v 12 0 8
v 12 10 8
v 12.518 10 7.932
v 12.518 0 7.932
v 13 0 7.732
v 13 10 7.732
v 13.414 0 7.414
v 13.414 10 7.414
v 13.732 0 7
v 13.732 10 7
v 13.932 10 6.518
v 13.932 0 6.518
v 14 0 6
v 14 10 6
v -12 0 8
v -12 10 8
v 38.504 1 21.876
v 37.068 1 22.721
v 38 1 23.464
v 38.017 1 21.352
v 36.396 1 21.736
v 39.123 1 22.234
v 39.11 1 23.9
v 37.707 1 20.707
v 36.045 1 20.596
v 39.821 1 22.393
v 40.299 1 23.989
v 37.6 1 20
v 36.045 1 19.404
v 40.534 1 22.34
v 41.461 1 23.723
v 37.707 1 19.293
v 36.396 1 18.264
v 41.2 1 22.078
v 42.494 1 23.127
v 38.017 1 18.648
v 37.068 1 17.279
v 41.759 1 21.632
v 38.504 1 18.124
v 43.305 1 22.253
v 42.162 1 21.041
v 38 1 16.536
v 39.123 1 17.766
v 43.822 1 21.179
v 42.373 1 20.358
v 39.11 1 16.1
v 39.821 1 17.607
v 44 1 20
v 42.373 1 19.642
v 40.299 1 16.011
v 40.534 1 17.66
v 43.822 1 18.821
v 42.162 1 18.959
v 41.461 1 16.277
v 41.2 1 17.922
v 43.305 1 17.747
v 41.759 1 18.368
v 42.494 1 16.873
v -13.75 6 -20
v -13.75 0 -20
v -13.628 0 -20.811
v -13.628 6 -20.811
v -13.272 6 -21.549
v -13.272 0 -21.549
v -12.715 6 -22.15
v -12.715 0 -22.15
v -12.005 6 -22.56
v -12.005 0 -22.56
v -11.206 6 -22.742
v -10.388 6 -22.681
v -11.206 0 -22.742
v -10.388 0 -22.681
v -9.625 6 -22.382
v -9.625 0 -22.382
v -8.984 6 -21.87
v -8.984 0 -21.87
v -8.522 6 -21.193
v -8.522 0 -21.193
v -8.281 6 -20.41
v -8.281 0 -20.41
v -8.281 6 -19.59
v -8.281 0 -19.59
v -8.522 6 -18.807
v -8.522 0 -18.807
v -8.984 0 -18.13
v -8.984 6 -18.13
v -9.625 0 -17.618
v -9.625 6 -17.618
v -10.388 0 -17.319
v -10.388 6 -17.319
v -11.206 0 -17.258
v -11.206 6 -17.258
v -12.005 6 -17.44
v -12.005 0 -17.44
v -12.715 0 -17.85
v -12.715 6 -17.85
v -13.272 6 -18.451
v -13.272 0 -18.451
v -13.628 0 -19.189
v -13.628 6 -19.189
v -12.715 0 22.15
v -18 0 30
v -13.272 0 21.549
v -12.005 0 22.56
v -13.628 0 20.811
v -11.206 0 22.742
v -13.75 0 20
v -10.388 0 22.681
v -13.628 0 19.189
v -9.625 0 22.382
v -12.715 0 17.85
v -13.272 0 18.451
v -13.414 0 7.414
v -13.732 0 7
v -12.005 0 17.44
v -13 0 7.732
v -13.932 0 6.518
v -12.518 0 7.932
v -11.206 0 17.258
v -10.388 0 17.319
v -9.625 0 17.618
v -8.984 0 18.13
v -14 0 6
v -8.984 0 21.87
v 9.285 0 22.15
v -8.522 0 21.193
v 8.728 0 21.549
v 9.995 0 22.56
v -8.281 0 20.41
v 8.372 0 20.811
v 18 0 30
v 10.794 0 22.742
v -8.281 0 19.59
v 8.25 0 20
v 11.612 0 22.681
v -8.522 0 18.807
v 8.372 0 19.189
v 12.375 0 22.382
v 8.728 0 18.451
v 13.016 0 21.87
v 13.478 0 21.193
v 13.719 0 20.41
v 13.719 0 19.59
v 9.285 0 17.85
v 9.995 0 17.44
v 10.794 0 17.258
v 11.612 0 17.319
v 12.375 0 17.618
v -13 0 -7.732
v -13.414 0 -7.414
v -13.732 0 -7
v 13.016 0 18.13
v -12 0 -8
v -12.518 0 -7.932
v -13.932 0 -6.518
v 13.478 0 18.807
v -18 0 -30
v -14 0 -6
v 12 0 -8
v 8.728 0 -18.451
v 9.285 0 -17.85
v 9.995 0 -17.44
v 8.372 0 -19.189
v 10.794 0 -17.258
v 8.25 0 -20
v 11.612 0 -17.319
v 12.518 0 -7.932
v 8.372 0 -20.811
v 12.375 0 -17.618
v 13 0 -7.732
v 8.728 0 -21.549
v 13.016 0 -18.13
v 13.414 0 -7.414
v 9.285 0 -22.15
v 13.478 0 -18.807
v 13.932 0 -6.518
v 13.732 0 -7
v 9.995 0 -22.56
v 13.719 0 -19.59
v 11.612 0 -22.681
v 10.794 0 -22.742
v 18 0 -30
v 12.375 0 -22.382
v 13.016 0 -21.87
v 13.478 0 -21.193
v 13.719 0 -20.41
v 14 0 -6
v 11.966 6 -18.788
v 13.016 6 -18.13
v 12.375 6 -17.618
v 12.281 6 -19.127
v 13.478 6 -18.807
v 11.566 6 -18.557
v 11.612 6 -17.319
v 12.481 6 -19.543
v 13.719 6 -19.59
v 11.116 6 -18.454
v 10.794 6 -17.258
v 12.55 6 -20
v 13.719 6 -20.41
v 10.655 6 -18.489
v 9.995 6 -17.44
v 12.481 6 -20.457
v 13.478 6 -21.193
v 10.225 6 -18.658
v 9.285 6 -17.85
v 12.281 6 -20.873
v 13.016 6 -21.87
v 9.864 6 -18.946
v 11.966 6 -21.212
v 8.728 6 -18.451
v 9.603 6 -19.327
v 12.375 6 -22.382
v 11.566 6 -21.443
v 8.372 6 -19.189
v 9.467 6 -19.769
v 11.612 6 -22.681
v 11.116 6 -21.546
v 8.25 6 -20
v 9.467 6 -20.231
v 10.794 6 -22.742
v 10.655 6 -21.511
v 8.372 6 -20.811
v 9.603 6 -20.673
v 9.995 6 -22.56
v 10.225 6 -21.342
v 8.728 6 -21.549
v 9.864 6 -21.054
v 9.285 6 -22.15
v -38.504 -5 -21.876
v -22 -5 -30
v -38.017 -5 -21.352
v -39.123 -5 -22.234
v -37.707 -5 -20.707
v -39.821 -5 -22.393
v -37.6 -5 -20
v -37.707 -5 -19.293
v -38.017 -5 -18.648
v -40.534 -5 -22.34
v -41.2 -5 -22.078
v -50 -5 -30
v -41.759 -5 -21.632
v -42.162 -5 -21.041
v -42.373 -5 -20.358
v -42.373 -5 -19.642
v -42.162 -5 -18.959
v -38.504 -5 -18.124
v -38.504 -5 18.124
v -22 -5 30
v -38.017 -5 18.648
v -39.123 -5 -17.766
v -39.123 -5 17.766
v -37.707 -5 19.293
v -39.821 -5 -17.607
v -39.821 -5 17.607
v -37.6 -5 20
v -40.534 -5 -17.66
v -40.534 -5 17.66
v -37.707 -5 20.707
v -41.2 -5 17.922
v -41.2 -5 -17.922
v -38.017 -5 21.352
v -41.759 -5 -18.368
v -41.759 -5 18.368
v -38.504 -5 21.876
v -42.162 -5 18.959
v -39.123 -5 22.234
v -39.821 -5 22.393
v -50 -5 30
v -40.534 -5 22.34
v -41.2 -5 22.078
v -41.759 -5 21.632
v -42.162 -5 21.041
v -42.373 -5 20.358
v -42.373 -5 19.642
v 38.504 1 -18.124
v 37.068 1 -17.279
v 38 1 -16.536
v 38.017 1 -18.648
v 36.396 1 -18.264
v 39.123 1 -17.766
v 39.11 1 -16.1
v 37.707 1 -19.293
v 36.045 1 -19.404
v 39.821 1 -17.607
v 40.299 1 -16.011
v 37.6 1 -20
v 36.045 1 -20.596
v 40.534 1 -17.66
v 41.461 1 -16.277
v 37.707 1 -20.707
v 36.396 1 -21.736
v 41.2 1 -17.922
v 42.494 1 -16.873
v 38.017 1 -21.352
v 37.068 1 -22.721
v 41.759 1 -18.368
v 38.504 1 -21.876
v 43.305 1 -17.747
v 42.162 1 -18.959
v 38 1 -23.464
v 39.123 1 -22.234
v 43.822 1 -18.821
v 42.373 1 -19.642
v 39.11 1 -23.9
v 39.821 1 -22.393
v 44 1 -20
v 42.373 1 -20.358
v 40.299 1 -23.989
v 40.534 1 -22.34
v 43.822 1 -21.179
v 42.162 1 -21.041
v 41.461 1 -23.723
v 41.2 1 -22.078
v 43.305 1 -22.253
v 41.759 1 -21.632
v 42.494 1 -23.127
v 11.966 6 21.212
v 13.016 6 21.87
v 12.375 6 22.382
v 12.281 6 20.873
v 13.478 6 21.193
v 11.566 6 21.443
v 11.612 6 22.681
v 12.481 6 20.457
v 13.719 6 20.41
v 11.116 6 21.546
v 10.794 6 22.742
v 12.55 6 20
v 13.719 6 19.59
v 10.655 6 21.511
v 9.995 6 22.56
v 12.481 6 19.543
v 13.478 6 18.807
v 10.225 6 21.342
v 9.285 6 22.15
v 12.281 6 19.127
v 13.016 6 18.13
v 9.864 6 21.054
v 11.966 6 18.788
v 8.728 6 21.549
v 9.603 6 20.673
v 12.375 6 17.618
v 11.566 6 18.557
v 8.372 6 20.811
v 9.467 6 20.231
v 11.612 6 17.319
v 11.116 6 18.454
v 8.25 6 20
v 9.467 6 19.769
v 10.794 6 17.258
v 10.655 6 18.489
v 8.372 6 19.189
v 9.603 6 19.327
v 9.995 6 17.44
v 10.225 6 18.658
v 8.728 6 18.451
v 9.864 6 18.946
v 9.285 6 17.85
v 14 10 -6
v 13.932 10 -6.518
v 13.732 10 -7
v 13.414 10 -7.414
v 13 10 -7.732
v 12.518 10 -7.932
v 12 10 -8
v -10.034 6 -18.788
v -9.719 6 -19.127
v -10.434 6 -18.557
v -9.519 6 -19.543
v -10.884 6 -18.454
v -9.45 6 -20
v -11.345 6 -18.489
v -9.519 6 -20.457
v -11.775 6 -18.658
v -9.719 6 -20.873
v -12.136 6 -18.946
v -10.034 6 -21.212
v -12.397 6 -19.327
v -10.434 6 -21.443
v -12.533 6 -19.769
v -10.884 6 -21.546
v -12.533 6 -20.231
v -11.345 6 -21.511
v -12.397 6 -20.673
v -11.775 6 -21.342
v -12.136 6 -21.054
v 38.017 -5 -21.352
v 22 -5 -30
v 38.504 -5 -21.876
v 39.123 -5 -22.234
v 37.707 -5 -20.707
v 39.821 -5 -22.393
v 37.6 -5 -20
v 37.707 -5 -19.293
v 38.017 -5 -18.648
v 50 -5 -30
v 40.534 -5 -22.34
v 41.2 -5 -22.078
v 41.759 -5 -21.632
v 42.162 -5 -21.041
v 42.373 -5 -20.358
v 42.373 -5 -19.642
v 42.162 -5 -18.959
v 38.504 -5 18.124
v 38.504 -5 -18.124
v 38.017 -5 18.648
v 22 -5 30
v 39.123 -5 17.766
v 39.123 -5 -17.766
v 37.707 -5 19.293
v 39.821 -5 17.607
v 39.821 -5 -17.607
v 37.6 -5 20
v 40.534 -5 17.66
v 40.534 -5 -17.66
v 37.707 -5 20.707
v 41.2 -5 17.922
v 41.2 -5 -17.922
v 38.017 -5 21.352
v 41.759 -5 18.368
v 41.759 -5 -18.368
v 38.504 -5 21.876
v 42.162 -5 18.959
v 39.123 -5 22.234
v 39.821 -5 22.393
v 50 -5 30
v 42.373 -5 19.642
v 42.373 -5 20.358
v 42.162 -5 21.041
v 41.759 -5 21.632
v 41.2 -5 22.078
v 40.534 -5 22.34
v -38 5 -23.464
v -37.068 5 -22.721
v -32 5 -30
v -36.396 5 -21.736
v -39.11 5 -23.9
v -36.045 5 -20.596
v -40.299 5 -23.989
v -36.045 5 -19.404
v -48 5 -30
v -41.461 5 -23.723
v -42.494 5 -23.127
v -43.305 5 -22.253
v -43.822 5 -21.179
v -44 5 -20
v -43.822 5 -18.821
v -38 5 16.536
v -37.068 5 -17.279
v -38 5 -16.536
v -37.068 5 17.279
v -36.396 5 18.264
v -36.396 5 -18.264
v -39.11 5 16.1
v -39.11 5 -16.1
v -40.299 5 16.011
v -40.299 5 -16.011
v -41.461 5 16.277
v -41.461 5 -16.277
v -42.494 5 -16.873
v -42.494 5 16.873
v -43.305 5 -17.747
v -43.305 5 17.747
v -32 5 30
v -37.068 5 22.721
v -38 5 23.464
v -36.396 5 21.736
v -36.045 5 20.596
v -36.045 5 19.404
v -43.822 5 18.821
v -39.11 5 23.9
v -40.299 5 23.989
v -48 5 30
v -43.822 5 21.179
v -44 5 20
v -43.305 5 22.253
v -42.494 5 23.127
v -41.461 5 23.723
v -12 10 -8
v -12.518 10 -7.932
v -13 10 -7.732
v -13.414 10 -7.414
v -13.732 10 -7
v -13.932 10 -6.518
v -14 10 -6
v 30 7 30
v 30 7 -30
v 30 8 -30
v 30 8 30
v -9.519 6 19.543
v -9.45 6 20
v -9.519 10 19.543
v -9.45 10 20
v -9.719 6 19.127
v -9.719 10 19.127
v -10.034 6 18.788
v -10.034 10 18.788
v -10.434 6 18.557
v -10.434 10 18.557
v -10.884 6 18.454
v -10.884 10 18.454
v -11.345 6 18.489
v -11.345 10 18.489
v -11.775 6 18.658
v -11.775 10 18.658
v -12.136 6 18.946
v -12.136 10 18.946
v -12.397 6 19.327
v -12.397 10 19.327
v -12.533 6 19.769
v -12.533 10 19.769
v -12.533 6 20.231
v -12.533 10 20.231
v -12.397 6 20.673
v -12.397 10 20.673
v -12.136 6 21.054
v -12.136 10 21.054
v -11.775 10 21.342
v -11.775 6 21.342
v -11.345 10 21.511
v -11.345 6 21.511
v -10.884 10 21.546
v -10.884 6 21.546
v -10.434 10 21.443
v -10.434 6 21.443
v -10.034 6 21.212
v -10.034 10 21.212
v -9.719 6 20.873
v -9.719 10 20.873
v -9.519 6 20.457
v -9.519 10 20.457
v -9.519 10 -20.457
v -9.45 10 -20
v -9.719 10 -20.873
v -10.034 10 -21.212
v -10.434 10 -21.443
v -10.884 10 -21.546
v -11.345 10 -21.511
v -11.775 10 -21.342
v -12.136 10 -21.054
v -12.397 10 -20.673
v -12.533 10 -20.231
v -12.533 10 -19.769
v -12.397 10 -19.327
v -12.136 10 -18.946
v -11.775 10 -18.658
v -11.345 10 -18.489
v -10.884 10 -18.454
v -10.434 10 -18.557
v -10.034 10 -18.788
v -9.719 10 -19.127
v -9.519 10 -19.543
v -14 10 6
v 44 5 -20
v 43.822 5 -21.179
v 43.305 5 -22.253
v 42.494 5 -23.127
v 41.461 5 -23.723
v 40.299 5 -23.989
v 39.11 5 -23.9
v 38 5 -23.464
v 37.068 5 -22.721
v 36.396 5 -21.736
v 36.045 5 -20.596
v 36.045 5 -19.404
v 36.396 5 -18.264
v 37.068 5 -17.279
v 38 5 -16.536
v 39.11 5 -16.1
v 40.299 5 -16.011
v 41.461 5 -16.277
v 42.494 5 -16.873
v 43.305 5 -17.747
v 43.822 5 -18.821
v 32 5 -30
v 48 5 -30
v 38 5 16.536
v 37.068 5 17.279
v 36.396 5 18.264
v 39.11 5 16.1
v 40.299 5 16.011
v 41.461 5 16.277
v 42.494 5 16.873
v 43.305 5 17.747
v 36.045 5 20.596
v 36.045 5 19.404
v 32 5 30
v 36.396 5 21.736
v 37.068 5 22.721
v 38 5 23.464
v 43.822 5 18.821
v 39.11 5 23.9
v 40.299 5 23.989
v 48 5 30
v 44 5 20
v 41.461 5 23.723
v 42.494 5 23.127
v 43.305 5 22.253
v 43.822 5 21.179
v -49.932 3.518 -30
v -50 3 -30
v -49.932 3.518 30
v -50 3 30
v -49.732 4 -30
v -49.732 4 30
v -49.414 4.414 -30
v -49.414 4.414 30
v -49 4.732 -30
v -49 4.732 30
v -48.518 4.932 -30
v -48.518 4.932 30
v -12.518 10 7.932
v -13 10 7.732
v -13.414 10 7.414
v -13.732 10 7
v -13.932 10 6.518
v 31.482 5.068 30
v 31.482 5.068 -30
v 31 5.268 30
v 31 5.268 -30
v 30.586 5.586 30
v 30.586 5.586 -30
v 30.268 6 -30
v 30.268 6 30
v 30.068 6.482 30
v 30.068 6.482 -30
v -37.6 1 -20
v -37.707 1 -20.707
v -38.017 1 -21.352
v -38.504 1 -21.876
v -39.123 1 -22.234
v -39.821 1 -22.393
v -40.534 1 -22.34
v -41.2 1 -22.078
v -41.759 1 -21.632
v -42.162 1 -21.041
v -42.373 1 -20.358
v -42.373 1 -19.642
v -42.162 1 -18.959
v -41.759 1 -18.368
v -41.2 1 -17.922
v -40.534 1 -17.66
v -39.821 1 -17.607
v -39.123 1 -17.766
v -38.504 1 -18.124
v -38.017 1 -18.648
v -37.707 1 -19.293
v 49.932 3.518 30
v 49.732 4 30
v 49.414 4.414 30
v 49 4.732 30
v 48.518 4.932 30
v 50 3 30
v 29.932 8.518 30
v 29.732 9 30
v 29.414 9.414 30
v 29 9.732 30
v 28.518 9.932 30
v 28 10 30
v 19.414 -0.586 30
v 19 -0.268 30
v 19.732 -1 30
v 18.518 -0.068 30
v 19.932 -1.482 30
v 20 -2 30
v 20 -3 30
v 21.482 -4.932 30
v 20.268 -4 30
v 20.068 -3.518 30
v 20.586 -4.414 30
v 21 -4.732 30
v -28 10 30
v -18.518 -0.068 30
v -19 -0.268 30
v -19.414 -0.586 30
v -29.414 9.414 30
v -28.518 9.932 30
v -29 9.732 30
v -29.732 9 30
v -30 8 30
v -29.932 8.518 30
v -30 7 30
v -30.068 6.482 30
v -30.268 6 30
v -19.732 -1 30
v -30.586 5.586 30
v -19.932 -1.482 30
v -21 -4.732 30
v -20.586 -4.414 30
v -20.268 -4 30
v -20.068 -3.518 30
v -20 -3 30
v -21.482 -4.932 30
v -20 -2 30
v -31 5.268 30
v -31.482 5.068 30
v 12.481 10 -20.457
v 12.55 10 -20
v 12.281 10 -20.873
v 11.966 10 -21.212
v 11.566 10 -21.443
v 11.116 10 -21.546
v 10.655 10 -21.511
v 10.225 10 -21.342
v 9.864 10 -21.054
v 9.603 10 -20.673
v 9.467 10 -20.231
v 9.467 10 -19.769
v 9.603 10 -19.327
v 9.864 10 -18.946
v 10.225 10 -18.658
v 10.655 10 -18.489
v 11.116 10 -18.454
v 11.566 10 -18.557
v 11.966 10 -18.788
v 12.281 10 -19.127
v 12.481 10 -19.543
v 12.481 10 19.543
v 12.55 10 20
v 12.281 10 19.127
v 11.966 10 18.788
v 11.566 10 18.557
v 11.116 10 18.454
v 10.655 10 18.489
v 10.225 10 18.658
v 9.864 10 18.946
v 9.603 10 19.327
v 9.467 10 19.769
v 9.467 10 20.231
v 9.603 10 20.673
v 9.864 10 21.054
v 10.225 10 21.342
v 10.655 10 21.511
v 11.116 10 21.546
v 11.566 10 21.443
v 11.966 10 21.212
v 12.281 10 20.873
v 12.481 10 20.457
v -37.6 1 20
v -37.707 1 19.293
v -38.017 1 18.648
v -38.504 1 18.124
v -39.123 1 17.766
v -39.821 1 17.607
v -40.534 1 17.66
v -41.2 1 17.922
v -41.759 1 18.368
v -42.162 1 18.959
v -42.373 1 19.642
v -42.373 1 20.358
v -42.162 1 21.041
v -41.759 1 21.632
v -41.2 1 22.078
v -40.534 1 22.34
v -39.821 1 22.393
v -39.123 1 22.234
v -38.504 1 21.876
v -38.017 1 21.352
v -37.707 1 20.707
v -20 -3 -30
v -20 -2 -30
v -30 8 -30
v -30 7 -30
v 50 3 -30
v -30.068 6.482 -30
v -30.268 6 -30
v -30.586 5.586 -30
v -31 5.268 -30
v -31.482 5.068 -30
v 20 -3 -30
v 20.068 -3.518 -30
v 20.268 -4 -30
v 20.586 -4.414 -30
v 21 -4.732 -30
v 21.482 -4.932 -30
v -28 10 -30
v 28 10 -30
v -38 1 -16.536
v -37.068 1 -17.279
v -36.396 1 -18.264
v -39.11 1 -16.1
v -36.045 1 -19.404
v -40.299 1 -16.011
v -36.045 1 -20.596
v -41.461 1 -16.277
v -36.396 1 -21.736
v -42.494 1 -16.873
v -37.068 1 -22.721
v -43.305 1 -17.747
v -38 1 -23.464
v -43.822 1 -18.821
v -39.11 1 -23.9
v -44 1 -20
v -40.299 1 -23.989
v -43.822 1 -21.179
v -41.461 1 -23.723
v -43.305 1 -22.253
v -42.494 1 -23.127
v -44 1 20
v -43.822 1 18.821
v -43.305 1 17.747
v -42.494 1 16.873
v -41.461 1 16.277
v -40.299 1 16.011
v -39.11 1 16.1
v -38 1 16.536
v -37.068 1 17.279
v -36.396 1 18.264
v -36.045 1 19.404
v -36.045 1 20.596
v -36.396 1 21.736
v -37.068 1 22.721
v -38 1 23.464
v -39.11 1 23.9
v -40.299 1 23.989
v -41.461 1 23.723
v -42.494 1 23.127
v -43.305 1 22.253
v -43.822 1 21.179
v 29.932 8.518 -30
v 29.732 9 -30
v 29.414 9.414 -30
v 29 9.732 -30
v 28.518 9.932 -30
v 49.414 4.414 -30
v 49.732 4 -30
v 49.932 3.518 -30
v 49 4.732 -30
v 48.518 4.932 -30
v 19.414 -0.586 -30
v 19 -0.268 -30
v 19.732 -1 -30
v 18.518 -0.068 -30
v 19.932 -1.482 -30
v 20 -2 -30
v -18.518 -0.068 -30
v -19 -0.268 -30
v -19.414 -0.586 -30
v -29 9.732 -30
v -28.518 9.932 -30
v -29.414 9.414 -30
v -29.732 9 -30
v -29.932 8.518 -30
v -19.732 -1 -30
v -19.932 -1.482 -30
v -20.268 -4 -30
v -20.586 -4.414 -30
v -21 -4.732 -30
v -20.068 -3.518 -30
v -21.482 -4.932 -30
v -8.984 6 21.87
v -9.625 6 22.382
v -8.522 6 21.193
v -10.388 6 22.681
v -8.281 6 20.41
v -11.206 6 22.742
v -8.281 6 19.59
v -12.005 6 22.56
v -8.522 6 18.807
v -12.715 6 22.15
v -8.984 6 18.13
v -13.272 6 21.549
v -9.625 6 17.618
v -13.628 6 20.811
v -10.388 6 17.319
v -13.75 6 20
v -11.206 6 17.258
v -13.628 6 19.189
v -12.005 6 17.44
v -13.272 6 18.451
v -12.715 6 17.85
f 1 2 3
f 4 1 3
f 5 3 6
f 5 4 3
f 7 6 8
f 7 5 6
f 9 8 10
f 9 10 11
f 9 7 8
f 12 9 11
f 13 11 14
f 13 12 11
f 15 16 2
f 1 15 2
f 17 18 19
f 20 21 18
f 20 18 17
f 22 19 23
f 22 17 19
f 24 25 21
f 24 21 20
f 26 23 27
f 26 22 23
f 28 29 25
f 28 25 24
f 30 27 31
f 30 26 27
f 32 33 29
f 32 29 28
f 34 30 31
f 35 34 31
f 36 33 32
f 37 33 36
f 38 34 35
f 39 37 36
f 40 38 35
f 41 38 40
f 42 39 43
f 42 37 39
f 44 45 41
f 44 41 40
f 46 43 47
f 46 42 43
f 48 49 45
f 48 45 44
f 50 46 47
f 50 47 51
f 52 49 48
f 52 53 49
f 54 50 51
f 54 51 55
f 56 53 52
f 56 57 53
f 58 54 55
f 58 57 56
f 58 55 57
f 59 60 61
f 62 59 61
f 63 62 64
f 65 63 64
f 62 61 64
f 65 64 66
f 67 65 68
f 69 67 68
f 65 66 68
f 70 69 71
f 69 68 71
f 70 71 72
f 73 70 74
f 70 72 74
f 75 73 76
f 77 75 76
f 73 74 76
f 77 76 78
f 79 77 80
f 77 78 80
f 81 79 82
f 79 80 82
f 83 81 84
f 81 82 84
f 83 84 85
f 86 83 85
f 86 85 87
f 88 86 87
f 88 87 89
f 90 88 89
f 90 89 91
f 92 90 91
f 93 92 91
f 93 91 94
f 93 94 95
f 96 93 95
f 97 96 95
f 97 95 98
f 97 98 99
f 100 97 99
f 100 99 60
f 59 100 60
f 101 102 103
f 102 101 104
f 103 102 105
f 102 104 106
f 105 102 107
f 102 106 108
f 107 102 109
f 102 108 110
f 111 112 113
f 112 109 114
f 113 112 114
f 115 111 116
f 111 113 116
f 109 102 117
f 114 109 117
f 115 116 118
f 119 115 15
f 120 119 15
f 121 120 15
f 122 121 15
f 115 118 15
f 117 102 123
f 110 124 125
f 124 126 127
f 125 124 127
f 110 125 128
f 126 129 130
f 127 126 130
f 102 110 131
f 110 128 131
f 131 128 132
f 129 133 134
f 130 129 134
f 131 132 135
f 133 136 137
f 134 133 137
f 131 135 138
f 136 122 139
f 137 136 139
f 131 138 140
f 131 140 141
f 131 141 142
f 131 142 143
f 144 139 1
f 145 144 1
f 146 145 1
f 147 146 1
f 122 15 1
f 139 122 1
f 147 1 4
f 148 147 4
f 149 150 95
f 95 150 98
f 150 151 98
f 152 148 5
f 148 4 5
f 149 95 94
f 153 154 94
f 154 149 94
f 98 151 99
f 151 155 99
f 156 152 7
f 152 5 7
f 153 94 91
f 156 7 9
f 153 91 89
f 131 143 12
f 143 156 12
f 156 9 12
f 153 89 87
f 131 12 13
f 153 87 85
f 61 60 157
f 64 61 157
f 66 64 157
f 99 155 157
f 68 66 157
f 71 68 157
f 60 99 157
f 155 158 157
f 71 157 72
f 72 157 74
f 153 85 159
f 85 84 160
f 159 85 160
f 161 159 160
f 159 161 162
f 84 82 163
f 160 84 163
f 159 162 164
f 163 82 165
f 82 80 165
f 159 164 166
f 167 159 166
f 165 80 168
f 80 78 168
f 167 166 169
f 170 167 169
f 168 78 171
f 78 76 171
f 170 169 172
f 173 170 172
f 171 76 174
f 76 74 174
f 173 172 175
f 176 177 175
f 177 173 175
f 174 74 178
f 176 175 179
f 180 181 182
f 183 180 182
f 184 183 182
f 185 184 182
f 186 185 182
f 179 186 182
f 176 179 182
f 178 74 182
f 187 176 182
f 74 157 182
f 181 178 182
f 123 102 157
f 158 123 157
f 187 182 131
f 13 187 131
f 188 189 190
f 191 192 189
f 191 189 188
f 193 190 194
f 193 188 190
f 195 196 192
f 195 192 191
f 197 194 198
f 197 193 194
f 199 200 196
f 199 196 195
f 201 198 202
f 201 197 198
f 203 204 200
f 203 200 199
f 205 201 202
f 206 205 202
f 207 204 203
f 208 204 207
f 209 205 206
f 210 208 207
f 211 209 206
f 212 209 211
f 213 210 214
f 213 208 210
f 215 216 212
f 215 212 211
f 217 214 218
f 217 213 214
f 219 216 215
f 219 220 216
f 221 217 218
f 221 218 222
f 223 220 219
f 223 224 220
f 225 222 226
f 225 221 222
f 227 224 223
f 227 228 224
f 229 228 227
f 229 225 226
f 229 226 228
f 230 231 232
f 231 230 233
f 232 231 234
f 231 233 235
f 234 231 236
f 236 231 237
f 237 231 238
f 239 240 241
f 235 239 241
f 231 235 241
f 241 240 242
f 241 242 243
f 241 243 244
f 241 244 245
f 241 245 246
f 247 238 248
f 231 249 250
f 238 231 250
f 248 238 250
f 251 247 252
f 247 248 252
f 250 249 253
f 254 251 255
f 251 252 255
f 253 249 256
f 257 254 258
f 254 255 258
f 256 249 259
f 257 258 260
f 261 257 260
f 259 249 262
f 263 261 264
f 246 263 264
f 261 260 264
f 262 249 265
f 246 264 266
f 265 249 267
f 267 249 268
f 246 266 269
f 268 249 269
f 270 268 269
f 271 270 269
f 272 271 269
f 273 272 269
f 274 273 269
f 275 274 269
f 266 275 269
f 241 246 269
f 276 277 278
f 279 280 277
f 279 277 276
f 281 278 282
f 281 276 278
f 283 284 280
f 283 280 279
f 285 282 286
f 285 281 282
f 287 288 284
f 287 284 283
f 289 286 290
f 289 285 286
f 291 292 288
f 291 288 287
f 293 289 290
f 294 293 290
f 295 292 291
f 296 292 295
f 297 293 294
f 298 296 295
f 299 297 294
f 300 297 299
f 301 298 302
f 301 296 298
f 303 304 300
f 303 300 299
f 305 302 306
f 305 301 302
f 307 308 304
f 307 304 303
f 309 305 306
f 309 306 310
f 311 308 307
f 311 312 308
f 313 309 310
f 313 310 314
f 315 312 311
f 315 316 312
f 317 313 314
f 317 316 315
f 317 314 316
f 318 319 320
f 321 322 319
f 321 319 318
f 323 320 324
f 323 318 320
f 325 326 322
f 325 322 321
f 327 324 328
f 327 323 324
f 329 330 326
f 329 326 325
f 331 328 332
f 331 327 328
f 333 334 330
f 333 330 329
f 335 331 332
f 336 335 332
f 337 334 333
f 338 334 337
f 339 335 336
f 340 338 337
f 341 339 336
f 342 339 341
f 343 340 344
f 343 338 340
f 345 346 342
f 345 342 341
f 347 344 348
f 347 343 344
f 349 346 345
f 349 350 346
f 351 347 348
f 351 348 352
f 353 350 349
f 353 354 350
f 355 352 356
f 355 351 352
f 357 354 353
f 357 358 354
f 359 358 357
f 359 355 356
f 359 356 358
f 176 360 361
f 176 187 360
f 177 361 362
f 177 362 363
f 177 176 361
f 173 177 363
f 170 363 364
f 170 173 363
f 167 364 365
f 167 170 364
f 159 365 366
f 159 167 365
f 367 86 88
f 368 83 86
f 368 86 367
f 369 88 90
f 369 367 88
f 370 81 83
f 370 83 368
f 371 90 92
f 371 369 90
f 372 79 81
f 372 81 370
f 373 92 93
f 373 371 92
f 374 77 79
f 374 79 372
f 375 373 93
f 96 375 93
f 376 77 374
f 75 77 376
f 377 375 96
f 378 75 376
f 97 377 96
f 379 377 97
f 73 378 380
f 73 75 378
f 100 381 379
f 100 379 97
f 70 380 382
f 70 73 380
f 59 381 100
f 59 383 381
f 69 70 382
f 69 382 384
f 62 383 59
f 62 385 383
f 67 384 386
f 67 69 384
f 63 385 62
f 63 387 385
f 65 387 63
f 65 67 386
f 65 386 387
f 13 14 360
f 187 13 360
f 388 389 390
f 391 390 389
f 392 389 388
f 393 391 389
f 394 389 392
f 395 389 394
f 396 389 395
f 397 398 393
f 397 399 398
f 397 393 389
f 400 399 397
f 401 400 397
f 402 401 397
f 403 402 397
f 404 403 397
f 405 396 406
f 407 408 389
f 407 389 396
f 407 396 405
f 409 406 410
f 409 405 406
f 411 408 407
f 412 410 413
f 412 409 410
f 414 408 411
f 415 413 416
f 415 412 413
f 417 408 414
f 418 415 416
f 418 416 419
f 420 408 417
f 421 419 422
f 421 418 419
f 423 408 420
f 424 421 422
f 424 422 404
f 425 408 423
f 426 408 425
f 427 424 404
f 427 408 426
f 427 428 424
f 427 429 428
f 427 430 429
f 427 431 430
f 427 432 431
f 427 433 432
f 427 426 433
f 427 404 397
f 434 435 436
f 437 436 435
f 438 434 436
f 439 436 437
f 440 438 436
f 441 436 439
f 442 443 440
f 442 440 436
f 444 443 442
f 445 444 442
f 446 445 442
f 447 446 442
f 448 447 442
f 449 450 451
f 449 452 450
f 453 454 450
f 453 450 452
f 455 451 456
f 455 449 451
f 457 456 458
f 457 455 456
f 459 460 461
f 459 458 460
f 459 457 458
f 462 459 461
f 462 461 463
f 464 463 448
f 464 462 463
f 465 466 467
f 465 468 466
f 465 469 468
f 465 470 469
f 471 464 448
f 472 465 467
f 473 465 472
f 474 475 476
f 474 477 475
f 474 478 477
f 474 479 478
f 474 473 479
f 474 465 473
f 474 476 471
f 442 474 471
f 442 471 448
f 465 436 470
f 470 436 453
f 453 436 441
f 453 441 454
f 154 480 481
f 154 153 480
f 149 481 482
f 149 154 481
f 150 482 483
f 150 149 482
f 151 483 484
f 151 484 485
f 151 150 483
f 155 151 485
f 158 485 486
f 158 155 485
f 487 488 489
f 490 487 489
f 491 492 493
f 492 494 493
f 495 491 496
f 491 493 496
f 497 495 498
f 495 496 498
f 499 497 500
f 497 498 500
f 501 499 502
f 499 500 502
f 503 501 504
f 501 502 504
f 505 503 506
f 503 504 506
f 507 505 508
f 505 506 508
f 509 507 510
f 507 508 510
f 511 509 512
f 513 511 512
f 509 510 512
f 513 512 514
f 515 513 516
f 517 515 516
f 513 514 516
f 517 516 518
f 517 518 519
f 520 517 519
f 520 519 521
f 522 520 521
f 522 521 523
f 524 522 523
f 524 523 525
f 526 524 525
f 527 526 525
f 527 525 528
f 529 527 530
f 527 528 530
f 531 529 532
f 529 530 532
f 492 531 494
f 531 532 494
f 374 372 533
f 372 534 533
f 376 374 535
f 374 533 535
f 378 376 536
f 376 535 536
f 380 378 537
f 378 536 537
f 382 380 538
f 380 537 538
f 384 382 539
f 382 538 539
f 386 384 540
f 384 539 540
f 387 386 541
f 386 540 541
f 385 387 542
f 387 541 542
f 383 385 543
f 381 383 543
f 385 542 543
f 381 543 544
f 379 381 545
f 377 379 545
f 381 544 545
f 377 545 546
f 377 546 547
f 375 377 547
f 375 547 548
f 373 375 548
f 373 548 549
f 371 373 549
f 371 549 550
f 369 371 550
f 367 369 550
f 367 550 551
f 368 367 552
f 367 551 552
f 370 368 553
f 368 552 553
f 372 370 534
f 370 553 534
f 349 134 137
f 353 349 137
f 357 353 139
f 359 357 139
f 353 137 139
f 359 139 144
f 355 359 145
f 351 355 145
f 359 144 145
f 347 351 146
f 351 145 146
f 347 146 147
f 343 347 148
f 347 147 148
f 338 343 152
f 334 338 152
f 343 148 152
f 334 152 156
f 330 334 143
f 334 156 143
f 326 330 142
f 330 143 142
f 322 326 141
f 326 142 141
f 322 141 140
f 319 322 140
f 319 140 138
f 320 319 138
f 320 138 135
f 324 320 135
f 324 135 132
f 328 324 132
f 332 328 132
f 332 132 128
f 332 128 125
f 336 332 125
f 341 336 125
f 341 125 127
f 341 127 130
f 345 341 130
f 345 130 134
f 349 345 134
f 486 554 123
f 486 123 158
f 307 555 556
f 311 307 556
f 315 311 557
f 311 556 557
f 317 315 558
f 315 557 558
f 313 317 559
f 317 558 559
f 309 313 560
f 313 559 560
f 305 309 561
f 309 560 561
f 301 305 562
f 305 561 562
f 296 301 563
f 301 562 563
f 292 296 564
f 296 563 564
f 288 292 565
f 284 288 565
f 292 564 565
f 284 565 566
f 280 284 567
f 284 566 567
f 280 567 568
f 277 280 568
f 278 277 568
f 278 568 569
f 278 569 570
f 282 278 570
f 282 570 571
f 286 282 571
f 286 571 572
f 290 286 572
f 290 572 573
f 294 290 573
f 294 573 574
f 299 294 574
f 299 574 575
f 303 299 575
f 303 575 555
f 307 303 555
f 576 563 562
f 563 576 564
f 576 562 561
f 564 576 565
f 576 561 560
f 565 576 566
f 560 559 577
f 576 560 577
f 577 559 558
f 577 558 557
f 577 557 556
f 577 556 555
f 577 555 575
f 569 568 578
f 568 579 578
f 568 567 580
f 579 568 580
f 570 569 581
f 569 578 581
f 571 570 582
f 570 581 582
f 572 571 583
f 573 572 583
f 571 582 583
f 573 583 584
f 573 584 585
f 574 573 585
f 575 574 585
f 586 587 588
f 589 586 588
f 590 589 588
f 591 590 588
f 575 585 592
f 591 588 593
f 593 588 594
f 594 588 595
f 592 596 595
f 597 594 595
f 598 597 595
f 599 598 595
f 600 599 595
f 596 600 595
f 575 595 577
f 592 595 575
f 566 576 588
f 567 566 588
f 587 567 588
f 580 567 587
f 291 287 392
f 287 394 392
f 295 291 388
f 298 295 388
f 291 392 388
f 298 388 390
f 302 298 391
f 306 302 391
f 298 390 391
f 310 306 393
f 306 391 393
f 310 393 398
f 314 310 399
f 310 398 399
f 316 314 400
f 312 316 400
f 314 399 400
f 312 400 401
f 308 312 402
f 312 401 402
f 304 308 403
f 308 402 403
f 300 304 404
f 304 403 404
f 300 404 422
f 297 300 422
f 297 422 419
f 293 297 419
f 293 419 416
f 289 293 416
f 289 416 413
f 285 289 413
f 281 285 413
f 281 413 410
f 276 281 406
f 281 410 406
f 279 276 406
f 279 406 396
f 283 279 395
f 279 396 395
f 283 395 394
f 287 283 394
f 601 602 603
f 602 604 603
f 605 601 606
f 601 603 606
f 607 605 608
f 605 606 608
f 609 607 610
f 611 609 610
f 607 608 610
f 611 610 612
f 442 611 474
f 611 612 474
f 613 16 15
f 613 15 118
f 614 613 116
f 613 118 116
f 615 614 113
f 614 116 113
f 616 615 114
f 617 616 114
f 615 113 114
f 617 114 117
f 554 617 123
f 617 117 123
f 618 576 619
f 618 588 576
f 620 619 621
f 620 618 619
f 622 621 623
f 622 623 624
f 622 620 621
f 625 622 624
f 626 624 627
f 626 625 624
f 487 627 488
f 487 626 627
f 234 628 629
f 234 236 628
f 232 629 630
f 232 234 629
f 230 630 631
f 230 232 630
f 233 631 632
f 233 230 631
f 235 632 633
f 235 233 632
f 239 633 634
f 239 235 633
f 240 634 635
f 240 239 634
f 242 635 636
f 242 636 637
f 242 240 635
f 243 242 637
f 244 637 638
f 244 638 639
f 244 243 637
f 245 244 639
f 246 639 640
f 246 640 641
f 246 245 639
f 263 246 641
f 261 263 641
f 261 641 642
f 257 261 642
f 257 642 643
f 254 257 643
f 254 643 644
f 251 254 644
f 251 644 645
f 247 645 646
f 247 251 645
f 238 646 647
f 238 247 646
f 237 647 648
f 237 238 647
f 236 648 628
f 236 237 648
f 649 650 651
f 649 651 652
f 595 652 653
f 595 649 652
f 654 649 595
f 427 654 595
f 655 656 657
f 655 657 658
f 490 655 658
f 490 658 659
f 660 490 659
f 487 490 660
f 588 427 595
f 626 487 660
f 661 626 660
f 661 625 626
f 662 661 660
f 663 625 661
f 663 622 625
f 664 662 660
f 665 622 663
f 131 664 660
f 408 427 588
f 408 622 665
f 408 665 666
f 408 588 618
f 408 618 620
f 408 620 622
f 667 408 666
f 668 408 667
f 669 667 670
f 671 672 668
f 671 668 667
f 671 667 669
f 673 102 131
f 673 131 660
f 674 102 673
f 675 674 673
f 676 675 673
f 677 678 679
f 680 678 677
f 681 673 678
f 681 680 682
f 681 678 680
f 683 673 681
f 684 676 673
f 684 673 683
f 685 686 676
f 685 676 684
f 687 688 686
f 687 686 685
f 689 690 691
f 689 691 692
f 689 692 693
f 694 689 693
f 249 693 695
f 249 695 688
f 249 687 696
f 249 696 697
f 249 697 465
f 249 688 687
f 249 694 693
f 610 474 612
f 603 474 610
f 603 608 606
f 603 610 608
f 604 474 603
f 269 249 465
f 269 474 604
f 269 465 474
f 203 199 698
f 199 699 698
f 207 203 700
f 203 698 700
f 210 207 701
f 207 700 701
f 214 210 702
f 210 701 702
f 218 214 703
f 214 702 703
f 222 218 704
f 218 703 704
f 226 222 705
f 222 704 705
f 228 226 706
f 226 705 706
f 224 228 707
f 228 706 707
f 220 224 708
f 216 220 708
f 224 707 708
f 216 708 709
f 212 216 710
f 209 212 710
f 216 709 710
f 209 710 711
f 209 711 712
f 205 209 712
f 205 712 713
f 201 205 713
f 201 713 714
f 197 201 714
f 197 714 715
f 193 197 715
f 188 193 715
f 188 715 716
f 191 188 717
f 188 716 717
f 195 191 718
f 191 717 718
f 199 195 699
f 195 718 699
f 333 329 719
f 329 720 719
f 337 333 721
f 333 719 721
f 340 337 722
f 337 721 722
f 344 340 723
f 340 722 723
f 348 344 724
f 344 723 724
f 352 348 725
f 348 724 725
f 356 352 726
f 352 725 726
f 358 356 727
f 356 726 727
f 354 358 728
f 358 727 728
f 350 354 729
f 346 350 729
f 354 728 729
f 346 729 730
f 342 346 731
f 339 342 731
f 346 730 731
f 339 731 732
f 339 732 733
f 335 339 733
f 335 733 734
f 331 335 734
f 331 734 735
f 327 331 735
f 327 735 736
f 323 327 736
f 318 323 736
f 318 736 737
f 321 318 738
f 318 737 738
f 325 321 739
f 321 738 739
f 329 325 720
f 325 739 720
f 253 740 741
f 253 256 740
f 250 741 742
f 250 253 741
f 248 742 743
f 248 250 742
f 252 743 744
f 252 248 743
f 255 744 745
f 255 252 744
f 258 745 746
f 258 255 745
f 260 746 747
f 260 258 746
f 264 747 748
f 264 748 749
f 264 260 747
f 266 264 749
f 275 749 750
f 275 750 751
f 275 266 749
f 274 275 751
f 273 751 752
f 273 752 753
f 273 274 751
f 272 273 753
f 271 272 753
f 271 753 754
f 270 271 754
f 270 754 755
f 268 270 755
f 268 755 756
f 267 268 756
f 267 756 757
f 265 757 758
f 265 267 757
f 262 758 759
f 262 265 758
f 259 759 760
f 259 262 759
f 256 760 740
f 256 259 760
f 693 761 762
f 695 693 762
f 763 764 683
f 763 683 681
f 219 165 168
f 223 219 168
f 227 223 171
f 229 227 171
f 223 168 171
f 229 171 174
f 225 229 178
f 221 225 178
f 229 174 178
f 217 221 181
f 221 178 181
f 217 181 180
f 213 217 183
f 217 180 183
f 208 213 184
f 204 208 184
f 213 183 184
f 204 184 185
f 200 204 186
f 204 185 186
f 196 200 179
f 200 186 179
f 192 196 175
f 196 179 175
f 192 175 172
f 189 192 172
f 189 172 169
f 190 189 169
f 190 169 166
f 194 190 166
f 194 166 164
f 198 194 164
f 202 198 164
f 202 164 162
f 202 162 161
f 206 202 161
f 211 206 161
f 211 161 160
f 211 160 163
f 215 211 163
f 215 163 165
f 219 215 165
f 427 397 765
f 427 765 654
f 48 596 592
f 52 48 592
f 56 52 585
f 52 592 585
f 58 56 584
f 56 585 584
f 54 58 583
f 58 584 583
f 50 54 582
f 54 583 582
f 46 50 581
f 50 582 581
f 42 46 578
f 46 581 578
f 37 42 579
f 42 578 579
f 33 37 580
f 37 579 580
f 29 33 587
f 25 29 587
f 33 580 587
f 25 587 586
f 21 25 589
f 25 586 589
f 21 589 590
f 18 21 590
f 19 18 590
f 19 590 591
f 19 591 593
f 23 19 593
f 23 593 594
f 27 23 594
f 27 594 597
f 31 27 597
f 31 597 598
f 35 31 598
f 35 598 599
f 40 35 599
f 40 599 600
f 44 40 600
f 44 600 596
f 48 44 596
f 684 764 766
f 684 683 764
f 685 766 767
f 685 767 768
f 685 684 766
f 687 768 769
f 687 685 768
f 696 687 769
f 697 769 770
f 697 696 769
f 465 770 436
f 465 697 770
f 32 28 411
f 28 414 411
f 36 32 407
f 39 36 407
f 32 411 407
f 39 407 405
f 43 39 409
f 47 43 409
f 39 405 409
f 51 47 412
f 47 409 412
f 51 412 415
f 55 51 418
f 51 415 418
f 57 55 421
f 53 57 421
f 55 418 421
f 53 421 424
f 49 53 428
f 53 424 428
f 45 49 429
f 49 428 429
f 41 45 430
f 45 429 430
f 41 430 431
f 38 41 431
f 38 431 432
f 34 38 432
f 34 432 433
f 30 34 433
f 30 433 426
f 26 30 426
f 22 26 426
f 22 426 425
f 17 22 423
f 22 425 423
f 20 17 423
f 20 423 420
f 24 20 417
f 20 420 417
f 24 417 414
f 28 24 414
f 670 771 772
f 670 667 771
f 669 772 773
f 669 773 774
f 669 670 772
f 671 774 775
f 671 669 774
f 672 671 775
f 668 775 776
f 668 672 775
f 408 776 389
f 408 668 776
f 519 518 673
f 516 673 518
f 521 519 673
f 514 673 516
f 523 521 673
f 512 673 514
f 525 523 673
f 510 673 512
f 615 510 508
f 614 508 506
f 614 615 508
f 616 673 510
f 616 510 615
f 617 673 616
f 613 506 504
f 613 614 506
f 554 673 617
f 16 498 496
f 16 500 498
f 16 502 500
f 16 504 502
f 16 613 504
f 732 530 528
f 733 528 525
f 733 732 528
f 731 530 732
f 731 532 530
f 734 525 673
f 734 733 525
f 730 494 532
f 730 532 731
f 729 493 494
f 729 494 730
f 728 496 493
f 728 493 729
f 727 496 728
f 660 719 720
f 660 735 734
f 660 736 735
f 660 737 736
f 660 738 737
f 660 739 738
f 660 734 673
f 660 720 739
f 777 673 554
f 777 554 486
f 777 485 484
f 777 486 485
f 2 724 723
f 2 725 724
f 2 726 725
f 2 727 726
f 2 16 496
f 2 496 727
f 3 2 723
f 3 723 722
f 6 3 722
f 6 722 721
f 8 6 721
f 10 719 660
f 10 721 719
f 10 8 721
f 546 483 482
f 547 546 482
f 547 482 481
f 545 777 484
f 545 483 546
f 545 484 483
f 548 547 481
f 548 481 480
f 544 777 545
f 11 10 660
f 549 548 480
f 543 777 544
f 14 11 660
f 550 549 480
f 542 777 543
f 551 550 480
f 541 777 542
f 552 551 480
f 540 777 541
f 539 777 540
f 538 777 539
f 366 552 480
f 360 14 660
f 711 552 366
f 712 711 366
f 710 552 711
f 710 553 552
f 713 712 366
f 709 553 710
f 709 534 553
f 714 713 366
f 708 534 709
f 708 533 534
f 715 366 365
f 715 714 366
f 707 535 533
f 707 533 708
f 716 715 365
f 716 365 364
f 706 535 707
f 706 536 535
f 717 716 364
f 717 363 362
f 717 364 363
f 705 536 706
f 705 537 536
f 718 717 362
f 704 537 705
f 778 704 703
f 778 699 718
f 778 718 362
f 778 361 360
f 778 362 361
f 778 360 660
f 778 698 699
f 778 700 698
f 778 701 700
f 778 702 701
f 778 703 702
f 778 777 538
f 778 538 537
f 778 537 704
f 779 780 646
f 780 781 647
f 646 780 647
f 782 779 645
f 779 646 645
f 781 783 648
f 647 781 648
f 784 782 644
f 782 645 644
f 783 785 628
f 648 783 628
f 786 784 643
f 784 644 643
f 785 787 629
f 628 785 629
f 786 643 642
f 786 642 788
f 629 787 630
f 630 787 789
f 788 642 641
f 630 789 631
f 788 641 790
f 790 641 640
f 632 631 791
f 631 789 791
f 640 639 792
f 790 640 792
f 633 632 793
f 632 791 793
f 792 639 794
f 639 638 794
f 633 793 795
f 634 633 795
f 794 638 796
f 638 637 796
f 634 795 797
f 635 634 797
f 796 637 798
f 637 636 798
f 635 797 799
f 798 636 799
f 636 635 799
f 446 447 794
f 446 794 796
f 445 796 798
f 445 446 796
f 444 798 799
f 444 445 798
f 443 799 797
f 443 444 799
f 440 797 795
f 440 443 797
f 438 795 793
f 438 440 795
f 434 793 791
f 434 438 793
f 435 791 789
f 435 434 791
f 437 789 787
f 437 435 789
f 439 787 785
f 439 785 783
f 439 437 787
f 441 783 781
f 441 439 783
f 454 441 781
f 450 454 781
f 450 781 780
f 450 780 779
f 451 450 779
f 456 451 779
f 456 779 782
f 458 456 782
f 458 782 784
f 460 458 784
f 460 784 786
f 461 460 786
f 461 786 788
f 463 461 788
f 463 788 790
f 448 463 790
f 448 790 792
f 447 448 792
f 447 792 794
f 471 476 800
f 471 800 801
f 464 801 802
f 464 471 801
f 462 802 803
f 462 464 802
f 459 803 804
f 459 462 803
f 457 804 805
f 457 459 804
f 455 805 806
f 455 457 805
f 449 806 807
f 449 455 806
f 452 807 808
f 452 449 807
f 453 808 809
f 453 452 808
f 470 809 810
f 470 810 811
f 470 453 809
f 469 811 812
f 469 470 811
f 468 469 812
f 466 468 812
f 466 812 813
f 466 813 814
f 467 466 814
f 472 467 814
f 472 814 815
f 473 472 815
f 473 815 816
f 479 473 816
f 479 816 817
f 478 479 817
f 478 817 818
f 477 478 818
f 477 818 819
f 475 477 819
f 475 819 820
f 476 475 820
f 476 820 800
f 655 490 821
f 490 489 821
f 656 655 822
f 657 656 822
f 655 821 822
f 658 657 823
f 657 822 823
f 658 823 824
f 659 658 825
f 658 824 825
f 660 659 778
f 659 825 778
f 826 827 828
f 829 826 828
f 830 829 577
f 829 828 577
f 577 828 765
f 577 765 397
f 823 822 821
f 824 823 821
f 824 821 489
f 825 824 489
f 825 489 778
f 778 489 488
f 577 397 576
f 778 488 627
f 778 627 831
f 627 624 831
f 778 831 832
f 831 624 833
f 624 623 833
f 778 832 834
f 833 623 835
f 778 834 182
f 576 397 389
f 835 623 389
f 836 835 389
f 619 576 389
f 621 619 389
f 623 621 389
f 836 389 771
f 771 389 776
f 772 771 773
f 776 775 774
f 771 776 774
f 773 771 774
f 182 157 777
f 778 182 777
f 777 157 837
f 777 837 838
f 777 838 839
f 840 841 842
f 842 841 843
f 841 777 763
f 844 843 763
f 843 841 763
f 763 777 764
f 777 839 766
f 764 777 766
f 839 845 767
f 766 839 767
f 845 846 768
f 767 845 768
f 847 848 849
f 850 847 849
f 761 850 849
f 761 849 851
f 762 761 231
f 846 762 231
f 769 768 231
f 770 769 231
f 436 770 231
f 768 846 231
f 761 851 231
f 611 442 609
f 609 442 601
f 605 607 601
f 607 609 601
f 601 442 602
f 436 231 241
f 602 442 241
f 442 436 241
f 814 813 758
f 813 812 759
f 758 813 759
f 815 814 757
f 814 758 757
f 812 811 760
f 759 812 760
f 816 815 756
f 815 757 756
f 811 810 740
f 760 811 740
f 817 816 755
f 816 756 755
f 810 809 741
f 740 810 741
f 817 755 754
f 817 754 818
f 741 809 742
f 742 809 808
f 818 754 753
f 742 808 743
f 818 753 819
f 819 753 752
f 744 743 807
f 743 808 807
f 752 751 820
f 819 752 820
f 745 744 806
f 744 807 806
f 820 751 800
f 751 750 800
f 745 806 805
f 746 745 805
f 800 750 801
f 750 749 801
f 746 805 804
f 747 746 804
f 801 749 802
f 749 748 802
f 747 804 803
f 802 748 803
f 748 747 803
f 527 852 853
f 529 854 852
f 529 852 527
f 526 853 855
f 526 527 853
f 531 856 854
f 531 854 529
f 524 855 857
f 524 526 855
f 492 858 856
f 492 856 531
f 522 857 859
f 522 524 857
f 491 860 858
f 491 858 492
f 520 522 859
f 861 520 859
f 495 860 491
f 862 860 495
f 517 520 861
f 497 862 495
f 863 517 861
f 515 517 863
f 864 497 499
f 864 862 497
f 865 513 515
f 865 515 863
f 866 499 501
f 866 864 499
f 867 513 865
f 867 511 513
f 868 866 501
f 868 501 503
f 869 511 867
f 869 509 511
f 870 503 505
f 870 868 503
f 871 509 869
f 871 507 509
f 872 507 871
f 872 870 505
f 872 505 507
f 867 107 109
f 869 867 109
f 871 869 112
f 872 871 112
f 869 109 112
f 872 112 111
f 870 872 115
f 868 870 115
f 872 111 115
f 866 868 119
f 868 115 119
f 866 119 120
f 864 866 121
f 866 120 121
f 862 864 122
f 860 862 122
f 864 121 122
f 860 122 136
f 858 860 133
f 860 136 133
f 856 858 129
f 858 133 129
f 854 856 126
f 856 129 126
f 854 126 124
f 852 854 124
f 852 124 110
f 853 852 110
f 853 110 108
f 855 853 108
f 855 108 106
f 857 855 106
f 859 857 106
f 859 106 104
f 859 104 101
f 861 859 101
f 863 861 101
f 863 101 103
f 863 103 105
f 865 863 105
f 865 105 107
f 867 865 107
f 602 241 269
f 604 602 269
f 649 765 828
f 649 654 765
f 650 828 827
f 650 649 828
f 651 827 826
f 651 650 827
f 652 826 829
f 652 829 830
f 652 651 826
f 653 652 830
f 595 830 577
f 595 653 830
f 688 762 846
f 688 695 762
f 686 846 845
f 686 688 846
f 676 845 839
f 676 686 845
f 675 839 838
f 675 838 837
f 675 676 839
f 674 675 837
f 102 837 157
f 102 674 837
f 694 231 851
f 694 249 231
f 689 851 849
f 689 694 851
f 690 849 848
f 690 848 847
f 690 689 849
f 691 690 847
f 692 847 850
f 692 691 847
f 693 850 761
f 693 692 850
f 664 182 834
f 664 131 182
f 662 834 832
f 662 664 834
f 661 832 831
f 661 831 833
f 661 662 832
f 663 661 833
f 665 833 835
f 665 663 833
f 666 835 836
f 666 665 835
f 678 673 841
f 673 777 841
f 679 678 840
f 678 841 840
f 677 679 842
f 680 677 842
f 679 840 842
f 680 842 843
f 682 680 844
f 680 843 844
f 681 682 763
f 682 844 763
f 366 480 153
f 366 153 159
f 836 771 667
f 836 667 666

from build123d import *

# Parameters (mm, degrees)
SKETCH2_W                        = 60
SKETCH2_H                        = 60
BOSS_EXTRUDE1_DEPTH              = 10
SKETCH7_W                        = 28
SKETCH7_H                        = 16
CUT_EXTRUDE2_DEPTH               = 44.588989435
FILLET2_R                        = 2
CBORE_FOR_M2_5_SHCS2_D           = 3.1
CBORE_FOR_M2_5_SHCS2_CBORE_D     = 5.5
CBORE_FOR_M2_5_SHCS2_CBORE_DEPTH = 2.5
MOVE_FACE1_BY                    = 3.5
MOVE_FACE1_2_BY                  = 3.5
MOVE_FACE1_3_BY                  = 3.5
MOVE_FACE1_4_BY                  = 3.5
SKETCH11_W                       = 10
SKETCH11_H                       = 5
BOSS_EXTRUDE2_DEPTH              = 60
SKETCH12_W                       = 20
SKETCH12_H                       = 60
BOSS_EXTRUDE3_DEPTH              = 10
CBORE_FOR_M4_SHCS1_D             = 4.8
CBORE_FOR_M4_SHCS1_CBORE_D       = 8
CBORE_FOR_M4_SHCS1_CBORE_DEPTH   = 4
FILLET5_R                        = 2


with BuildPart() as part:
    # Sketch2 → Boss-Extrude1 (new body)
    with BuildSketch(Plane(origin=(0, 0, 0), x_dir=(1, 0, 0), z_dir=(0, 1, 0))):
        Rectangle(SKETCH2_W, SKETCH2_H)
    extrude(amount=BOSS_EXTRUDE1_DEPTH)

    # Sketch7 → Cut-Extrude2 (cut, through all)
    with BuildSketch(Plane(origin=(0, 10, 0), x_dir=(1, 0, 0), z_dir=(0, 1, 0))):
        Rectangle(SKETCH7_W, SKETCH7_H)
    extrude(amount=-CUT_EXTRUDE2_DEPTH, mode=Mode.SUBTRACT)

    # Fillet2
    fillet2_edges = [part.edges().sort_by_distance(p)[0] for p in [
        (-14, 5, 8),
        (-14, 5, -8),
        (14, 5, -8),
        (14, 5, 8),
    ]]
    fillet(fillet2_edges, radius=FILLET2_R)

    # CBORE for M2.5 SHCS2 (through all)
    with Locations(Plane(origin=(0, 0, 0), x_dir=(-1, 0, 0), z_dir=(0, -1, 0))):
        with Locations((11, -20), (-11, -20), (11, 20), (-11, 20)):
            CounterBoreHole(CBORE_FOR_M2_5_SHCS2_D / 2, CBORE_FOR_M2_5_SHCS2_CBORE_D / 2, CBORE_FOR_M2_5_SHCS2_CBORE_DEPTH)

    # Move Face1: a face moved inward by 3.5
    extrude(part.faces().sort_by_distance((11, 2.5, 22.2))[0], amount=MOVE_FACE1_BY, dir=(0, 1, 0), mode=Mode.SUBTRACT)

    # Move Face1 2: a face moved inward by 3.5
    extrude(part.faces().sort_by_distance((-11, 2.5, 22.2))[0], amount=MOVE_FACE1_2_BY, dir=(0, 1, 0), mode=Mode.SUBTRACT)

    # Move Face1 3: a face moved inward by 3.5
    extrude(part.faces().sort_by_distance((11, 2.5, -17.8))[0], amount=MOVE_FACE1_3_BY, dir=(0, 1, 0), mode=Mode.SUBTRACT)

    # Move Face1 4: a face moved inward by 3.5
    extrude(part.faces().sort_by_distance((-11, 2.5, -17.8))[0], amount=MOVE_FACE1_4_BY, dir=(0, 1, 0), mode=Mode.SUBTRACT)

    # Sketch11 → Boss-Extrude2 (add)
    with BuildSketch(Plane(origin=(0, 0, -30), x_dir=(-1, 0, 0), z_dir=(0, 0, -1))):
        with Locations((-25, -2.5)):
            Rectangle(SKETCH11_W, SKETCH11_H)
    boss_extrude2 = extrude(amount=-BOSS_EXTRUDE2_DEPTH)

    # Sketch12 → Boss-Extrude3 (add)
    with BuildSketch(Plane.XZ.offset(5)):
        with Locations((40, 0)):
            Rectangle(SKETCH12_W, SKETCH12_H)
    boss_extrude3 = extrude(amount=-BOSS_EXTRUDE3_DEPTH)

    # CBORE for M4 SHCS1 (through all)
    with Locations(Plane(origin=(0, 5, 0), x_dir=(1, 0, 0), z_dir=(0, 1, 0))):
        with Locations((40, 20), (40, -20)):
            cbore_for_m4_shcs1 = CounterBoreHole(CBORE_FOR_M4_SHCS1_D / 2, CBORE_FOR_M4_SHCS1_CBORE_D / 2, CBORE_FOR_M4_SHCS1_CBORE_DEPTH)

    # Mirror1: Boss-Extrude2, Boss-Extrude3, CBORE for M4 SHCS1 across plane
    add(boss_extrude2.mirror(Plane(origin=(0, 0, 0), x_dir=(0, 0, 1), z_dir=(1, 0, 0))))
    add(boss_extrude3.mirror(Plane(origin=(0, 0, 0), x_dir=(0, 0, 1), z_dir=(1, 0, 0))))
    add(cbore_for_m4_shcs1.mirror(Plane(origin=(0, 0, 0), x_dir=(0, 0, 1), z_dir=(1, 0, 0))), mode=Mode.SUBTRACT)

    # Fillet5
    fillet5_edges = [part.edges().sort_by_distance(p)[0] for p in [
        (50, 5, 0),
        (30, 5, 0),
        (30, 10, 0),
        (-20, 0, 0),
        (-20, -5, 0),
        (-30, 5, 0),
        (-50, 5, 0),
        (-30, 10, 0),
        (20, 0, 0),
        (20, -5, 0),
    ]]
    fillet(fillet5_edges, radius=FILLET5_R)


solid = part.part
